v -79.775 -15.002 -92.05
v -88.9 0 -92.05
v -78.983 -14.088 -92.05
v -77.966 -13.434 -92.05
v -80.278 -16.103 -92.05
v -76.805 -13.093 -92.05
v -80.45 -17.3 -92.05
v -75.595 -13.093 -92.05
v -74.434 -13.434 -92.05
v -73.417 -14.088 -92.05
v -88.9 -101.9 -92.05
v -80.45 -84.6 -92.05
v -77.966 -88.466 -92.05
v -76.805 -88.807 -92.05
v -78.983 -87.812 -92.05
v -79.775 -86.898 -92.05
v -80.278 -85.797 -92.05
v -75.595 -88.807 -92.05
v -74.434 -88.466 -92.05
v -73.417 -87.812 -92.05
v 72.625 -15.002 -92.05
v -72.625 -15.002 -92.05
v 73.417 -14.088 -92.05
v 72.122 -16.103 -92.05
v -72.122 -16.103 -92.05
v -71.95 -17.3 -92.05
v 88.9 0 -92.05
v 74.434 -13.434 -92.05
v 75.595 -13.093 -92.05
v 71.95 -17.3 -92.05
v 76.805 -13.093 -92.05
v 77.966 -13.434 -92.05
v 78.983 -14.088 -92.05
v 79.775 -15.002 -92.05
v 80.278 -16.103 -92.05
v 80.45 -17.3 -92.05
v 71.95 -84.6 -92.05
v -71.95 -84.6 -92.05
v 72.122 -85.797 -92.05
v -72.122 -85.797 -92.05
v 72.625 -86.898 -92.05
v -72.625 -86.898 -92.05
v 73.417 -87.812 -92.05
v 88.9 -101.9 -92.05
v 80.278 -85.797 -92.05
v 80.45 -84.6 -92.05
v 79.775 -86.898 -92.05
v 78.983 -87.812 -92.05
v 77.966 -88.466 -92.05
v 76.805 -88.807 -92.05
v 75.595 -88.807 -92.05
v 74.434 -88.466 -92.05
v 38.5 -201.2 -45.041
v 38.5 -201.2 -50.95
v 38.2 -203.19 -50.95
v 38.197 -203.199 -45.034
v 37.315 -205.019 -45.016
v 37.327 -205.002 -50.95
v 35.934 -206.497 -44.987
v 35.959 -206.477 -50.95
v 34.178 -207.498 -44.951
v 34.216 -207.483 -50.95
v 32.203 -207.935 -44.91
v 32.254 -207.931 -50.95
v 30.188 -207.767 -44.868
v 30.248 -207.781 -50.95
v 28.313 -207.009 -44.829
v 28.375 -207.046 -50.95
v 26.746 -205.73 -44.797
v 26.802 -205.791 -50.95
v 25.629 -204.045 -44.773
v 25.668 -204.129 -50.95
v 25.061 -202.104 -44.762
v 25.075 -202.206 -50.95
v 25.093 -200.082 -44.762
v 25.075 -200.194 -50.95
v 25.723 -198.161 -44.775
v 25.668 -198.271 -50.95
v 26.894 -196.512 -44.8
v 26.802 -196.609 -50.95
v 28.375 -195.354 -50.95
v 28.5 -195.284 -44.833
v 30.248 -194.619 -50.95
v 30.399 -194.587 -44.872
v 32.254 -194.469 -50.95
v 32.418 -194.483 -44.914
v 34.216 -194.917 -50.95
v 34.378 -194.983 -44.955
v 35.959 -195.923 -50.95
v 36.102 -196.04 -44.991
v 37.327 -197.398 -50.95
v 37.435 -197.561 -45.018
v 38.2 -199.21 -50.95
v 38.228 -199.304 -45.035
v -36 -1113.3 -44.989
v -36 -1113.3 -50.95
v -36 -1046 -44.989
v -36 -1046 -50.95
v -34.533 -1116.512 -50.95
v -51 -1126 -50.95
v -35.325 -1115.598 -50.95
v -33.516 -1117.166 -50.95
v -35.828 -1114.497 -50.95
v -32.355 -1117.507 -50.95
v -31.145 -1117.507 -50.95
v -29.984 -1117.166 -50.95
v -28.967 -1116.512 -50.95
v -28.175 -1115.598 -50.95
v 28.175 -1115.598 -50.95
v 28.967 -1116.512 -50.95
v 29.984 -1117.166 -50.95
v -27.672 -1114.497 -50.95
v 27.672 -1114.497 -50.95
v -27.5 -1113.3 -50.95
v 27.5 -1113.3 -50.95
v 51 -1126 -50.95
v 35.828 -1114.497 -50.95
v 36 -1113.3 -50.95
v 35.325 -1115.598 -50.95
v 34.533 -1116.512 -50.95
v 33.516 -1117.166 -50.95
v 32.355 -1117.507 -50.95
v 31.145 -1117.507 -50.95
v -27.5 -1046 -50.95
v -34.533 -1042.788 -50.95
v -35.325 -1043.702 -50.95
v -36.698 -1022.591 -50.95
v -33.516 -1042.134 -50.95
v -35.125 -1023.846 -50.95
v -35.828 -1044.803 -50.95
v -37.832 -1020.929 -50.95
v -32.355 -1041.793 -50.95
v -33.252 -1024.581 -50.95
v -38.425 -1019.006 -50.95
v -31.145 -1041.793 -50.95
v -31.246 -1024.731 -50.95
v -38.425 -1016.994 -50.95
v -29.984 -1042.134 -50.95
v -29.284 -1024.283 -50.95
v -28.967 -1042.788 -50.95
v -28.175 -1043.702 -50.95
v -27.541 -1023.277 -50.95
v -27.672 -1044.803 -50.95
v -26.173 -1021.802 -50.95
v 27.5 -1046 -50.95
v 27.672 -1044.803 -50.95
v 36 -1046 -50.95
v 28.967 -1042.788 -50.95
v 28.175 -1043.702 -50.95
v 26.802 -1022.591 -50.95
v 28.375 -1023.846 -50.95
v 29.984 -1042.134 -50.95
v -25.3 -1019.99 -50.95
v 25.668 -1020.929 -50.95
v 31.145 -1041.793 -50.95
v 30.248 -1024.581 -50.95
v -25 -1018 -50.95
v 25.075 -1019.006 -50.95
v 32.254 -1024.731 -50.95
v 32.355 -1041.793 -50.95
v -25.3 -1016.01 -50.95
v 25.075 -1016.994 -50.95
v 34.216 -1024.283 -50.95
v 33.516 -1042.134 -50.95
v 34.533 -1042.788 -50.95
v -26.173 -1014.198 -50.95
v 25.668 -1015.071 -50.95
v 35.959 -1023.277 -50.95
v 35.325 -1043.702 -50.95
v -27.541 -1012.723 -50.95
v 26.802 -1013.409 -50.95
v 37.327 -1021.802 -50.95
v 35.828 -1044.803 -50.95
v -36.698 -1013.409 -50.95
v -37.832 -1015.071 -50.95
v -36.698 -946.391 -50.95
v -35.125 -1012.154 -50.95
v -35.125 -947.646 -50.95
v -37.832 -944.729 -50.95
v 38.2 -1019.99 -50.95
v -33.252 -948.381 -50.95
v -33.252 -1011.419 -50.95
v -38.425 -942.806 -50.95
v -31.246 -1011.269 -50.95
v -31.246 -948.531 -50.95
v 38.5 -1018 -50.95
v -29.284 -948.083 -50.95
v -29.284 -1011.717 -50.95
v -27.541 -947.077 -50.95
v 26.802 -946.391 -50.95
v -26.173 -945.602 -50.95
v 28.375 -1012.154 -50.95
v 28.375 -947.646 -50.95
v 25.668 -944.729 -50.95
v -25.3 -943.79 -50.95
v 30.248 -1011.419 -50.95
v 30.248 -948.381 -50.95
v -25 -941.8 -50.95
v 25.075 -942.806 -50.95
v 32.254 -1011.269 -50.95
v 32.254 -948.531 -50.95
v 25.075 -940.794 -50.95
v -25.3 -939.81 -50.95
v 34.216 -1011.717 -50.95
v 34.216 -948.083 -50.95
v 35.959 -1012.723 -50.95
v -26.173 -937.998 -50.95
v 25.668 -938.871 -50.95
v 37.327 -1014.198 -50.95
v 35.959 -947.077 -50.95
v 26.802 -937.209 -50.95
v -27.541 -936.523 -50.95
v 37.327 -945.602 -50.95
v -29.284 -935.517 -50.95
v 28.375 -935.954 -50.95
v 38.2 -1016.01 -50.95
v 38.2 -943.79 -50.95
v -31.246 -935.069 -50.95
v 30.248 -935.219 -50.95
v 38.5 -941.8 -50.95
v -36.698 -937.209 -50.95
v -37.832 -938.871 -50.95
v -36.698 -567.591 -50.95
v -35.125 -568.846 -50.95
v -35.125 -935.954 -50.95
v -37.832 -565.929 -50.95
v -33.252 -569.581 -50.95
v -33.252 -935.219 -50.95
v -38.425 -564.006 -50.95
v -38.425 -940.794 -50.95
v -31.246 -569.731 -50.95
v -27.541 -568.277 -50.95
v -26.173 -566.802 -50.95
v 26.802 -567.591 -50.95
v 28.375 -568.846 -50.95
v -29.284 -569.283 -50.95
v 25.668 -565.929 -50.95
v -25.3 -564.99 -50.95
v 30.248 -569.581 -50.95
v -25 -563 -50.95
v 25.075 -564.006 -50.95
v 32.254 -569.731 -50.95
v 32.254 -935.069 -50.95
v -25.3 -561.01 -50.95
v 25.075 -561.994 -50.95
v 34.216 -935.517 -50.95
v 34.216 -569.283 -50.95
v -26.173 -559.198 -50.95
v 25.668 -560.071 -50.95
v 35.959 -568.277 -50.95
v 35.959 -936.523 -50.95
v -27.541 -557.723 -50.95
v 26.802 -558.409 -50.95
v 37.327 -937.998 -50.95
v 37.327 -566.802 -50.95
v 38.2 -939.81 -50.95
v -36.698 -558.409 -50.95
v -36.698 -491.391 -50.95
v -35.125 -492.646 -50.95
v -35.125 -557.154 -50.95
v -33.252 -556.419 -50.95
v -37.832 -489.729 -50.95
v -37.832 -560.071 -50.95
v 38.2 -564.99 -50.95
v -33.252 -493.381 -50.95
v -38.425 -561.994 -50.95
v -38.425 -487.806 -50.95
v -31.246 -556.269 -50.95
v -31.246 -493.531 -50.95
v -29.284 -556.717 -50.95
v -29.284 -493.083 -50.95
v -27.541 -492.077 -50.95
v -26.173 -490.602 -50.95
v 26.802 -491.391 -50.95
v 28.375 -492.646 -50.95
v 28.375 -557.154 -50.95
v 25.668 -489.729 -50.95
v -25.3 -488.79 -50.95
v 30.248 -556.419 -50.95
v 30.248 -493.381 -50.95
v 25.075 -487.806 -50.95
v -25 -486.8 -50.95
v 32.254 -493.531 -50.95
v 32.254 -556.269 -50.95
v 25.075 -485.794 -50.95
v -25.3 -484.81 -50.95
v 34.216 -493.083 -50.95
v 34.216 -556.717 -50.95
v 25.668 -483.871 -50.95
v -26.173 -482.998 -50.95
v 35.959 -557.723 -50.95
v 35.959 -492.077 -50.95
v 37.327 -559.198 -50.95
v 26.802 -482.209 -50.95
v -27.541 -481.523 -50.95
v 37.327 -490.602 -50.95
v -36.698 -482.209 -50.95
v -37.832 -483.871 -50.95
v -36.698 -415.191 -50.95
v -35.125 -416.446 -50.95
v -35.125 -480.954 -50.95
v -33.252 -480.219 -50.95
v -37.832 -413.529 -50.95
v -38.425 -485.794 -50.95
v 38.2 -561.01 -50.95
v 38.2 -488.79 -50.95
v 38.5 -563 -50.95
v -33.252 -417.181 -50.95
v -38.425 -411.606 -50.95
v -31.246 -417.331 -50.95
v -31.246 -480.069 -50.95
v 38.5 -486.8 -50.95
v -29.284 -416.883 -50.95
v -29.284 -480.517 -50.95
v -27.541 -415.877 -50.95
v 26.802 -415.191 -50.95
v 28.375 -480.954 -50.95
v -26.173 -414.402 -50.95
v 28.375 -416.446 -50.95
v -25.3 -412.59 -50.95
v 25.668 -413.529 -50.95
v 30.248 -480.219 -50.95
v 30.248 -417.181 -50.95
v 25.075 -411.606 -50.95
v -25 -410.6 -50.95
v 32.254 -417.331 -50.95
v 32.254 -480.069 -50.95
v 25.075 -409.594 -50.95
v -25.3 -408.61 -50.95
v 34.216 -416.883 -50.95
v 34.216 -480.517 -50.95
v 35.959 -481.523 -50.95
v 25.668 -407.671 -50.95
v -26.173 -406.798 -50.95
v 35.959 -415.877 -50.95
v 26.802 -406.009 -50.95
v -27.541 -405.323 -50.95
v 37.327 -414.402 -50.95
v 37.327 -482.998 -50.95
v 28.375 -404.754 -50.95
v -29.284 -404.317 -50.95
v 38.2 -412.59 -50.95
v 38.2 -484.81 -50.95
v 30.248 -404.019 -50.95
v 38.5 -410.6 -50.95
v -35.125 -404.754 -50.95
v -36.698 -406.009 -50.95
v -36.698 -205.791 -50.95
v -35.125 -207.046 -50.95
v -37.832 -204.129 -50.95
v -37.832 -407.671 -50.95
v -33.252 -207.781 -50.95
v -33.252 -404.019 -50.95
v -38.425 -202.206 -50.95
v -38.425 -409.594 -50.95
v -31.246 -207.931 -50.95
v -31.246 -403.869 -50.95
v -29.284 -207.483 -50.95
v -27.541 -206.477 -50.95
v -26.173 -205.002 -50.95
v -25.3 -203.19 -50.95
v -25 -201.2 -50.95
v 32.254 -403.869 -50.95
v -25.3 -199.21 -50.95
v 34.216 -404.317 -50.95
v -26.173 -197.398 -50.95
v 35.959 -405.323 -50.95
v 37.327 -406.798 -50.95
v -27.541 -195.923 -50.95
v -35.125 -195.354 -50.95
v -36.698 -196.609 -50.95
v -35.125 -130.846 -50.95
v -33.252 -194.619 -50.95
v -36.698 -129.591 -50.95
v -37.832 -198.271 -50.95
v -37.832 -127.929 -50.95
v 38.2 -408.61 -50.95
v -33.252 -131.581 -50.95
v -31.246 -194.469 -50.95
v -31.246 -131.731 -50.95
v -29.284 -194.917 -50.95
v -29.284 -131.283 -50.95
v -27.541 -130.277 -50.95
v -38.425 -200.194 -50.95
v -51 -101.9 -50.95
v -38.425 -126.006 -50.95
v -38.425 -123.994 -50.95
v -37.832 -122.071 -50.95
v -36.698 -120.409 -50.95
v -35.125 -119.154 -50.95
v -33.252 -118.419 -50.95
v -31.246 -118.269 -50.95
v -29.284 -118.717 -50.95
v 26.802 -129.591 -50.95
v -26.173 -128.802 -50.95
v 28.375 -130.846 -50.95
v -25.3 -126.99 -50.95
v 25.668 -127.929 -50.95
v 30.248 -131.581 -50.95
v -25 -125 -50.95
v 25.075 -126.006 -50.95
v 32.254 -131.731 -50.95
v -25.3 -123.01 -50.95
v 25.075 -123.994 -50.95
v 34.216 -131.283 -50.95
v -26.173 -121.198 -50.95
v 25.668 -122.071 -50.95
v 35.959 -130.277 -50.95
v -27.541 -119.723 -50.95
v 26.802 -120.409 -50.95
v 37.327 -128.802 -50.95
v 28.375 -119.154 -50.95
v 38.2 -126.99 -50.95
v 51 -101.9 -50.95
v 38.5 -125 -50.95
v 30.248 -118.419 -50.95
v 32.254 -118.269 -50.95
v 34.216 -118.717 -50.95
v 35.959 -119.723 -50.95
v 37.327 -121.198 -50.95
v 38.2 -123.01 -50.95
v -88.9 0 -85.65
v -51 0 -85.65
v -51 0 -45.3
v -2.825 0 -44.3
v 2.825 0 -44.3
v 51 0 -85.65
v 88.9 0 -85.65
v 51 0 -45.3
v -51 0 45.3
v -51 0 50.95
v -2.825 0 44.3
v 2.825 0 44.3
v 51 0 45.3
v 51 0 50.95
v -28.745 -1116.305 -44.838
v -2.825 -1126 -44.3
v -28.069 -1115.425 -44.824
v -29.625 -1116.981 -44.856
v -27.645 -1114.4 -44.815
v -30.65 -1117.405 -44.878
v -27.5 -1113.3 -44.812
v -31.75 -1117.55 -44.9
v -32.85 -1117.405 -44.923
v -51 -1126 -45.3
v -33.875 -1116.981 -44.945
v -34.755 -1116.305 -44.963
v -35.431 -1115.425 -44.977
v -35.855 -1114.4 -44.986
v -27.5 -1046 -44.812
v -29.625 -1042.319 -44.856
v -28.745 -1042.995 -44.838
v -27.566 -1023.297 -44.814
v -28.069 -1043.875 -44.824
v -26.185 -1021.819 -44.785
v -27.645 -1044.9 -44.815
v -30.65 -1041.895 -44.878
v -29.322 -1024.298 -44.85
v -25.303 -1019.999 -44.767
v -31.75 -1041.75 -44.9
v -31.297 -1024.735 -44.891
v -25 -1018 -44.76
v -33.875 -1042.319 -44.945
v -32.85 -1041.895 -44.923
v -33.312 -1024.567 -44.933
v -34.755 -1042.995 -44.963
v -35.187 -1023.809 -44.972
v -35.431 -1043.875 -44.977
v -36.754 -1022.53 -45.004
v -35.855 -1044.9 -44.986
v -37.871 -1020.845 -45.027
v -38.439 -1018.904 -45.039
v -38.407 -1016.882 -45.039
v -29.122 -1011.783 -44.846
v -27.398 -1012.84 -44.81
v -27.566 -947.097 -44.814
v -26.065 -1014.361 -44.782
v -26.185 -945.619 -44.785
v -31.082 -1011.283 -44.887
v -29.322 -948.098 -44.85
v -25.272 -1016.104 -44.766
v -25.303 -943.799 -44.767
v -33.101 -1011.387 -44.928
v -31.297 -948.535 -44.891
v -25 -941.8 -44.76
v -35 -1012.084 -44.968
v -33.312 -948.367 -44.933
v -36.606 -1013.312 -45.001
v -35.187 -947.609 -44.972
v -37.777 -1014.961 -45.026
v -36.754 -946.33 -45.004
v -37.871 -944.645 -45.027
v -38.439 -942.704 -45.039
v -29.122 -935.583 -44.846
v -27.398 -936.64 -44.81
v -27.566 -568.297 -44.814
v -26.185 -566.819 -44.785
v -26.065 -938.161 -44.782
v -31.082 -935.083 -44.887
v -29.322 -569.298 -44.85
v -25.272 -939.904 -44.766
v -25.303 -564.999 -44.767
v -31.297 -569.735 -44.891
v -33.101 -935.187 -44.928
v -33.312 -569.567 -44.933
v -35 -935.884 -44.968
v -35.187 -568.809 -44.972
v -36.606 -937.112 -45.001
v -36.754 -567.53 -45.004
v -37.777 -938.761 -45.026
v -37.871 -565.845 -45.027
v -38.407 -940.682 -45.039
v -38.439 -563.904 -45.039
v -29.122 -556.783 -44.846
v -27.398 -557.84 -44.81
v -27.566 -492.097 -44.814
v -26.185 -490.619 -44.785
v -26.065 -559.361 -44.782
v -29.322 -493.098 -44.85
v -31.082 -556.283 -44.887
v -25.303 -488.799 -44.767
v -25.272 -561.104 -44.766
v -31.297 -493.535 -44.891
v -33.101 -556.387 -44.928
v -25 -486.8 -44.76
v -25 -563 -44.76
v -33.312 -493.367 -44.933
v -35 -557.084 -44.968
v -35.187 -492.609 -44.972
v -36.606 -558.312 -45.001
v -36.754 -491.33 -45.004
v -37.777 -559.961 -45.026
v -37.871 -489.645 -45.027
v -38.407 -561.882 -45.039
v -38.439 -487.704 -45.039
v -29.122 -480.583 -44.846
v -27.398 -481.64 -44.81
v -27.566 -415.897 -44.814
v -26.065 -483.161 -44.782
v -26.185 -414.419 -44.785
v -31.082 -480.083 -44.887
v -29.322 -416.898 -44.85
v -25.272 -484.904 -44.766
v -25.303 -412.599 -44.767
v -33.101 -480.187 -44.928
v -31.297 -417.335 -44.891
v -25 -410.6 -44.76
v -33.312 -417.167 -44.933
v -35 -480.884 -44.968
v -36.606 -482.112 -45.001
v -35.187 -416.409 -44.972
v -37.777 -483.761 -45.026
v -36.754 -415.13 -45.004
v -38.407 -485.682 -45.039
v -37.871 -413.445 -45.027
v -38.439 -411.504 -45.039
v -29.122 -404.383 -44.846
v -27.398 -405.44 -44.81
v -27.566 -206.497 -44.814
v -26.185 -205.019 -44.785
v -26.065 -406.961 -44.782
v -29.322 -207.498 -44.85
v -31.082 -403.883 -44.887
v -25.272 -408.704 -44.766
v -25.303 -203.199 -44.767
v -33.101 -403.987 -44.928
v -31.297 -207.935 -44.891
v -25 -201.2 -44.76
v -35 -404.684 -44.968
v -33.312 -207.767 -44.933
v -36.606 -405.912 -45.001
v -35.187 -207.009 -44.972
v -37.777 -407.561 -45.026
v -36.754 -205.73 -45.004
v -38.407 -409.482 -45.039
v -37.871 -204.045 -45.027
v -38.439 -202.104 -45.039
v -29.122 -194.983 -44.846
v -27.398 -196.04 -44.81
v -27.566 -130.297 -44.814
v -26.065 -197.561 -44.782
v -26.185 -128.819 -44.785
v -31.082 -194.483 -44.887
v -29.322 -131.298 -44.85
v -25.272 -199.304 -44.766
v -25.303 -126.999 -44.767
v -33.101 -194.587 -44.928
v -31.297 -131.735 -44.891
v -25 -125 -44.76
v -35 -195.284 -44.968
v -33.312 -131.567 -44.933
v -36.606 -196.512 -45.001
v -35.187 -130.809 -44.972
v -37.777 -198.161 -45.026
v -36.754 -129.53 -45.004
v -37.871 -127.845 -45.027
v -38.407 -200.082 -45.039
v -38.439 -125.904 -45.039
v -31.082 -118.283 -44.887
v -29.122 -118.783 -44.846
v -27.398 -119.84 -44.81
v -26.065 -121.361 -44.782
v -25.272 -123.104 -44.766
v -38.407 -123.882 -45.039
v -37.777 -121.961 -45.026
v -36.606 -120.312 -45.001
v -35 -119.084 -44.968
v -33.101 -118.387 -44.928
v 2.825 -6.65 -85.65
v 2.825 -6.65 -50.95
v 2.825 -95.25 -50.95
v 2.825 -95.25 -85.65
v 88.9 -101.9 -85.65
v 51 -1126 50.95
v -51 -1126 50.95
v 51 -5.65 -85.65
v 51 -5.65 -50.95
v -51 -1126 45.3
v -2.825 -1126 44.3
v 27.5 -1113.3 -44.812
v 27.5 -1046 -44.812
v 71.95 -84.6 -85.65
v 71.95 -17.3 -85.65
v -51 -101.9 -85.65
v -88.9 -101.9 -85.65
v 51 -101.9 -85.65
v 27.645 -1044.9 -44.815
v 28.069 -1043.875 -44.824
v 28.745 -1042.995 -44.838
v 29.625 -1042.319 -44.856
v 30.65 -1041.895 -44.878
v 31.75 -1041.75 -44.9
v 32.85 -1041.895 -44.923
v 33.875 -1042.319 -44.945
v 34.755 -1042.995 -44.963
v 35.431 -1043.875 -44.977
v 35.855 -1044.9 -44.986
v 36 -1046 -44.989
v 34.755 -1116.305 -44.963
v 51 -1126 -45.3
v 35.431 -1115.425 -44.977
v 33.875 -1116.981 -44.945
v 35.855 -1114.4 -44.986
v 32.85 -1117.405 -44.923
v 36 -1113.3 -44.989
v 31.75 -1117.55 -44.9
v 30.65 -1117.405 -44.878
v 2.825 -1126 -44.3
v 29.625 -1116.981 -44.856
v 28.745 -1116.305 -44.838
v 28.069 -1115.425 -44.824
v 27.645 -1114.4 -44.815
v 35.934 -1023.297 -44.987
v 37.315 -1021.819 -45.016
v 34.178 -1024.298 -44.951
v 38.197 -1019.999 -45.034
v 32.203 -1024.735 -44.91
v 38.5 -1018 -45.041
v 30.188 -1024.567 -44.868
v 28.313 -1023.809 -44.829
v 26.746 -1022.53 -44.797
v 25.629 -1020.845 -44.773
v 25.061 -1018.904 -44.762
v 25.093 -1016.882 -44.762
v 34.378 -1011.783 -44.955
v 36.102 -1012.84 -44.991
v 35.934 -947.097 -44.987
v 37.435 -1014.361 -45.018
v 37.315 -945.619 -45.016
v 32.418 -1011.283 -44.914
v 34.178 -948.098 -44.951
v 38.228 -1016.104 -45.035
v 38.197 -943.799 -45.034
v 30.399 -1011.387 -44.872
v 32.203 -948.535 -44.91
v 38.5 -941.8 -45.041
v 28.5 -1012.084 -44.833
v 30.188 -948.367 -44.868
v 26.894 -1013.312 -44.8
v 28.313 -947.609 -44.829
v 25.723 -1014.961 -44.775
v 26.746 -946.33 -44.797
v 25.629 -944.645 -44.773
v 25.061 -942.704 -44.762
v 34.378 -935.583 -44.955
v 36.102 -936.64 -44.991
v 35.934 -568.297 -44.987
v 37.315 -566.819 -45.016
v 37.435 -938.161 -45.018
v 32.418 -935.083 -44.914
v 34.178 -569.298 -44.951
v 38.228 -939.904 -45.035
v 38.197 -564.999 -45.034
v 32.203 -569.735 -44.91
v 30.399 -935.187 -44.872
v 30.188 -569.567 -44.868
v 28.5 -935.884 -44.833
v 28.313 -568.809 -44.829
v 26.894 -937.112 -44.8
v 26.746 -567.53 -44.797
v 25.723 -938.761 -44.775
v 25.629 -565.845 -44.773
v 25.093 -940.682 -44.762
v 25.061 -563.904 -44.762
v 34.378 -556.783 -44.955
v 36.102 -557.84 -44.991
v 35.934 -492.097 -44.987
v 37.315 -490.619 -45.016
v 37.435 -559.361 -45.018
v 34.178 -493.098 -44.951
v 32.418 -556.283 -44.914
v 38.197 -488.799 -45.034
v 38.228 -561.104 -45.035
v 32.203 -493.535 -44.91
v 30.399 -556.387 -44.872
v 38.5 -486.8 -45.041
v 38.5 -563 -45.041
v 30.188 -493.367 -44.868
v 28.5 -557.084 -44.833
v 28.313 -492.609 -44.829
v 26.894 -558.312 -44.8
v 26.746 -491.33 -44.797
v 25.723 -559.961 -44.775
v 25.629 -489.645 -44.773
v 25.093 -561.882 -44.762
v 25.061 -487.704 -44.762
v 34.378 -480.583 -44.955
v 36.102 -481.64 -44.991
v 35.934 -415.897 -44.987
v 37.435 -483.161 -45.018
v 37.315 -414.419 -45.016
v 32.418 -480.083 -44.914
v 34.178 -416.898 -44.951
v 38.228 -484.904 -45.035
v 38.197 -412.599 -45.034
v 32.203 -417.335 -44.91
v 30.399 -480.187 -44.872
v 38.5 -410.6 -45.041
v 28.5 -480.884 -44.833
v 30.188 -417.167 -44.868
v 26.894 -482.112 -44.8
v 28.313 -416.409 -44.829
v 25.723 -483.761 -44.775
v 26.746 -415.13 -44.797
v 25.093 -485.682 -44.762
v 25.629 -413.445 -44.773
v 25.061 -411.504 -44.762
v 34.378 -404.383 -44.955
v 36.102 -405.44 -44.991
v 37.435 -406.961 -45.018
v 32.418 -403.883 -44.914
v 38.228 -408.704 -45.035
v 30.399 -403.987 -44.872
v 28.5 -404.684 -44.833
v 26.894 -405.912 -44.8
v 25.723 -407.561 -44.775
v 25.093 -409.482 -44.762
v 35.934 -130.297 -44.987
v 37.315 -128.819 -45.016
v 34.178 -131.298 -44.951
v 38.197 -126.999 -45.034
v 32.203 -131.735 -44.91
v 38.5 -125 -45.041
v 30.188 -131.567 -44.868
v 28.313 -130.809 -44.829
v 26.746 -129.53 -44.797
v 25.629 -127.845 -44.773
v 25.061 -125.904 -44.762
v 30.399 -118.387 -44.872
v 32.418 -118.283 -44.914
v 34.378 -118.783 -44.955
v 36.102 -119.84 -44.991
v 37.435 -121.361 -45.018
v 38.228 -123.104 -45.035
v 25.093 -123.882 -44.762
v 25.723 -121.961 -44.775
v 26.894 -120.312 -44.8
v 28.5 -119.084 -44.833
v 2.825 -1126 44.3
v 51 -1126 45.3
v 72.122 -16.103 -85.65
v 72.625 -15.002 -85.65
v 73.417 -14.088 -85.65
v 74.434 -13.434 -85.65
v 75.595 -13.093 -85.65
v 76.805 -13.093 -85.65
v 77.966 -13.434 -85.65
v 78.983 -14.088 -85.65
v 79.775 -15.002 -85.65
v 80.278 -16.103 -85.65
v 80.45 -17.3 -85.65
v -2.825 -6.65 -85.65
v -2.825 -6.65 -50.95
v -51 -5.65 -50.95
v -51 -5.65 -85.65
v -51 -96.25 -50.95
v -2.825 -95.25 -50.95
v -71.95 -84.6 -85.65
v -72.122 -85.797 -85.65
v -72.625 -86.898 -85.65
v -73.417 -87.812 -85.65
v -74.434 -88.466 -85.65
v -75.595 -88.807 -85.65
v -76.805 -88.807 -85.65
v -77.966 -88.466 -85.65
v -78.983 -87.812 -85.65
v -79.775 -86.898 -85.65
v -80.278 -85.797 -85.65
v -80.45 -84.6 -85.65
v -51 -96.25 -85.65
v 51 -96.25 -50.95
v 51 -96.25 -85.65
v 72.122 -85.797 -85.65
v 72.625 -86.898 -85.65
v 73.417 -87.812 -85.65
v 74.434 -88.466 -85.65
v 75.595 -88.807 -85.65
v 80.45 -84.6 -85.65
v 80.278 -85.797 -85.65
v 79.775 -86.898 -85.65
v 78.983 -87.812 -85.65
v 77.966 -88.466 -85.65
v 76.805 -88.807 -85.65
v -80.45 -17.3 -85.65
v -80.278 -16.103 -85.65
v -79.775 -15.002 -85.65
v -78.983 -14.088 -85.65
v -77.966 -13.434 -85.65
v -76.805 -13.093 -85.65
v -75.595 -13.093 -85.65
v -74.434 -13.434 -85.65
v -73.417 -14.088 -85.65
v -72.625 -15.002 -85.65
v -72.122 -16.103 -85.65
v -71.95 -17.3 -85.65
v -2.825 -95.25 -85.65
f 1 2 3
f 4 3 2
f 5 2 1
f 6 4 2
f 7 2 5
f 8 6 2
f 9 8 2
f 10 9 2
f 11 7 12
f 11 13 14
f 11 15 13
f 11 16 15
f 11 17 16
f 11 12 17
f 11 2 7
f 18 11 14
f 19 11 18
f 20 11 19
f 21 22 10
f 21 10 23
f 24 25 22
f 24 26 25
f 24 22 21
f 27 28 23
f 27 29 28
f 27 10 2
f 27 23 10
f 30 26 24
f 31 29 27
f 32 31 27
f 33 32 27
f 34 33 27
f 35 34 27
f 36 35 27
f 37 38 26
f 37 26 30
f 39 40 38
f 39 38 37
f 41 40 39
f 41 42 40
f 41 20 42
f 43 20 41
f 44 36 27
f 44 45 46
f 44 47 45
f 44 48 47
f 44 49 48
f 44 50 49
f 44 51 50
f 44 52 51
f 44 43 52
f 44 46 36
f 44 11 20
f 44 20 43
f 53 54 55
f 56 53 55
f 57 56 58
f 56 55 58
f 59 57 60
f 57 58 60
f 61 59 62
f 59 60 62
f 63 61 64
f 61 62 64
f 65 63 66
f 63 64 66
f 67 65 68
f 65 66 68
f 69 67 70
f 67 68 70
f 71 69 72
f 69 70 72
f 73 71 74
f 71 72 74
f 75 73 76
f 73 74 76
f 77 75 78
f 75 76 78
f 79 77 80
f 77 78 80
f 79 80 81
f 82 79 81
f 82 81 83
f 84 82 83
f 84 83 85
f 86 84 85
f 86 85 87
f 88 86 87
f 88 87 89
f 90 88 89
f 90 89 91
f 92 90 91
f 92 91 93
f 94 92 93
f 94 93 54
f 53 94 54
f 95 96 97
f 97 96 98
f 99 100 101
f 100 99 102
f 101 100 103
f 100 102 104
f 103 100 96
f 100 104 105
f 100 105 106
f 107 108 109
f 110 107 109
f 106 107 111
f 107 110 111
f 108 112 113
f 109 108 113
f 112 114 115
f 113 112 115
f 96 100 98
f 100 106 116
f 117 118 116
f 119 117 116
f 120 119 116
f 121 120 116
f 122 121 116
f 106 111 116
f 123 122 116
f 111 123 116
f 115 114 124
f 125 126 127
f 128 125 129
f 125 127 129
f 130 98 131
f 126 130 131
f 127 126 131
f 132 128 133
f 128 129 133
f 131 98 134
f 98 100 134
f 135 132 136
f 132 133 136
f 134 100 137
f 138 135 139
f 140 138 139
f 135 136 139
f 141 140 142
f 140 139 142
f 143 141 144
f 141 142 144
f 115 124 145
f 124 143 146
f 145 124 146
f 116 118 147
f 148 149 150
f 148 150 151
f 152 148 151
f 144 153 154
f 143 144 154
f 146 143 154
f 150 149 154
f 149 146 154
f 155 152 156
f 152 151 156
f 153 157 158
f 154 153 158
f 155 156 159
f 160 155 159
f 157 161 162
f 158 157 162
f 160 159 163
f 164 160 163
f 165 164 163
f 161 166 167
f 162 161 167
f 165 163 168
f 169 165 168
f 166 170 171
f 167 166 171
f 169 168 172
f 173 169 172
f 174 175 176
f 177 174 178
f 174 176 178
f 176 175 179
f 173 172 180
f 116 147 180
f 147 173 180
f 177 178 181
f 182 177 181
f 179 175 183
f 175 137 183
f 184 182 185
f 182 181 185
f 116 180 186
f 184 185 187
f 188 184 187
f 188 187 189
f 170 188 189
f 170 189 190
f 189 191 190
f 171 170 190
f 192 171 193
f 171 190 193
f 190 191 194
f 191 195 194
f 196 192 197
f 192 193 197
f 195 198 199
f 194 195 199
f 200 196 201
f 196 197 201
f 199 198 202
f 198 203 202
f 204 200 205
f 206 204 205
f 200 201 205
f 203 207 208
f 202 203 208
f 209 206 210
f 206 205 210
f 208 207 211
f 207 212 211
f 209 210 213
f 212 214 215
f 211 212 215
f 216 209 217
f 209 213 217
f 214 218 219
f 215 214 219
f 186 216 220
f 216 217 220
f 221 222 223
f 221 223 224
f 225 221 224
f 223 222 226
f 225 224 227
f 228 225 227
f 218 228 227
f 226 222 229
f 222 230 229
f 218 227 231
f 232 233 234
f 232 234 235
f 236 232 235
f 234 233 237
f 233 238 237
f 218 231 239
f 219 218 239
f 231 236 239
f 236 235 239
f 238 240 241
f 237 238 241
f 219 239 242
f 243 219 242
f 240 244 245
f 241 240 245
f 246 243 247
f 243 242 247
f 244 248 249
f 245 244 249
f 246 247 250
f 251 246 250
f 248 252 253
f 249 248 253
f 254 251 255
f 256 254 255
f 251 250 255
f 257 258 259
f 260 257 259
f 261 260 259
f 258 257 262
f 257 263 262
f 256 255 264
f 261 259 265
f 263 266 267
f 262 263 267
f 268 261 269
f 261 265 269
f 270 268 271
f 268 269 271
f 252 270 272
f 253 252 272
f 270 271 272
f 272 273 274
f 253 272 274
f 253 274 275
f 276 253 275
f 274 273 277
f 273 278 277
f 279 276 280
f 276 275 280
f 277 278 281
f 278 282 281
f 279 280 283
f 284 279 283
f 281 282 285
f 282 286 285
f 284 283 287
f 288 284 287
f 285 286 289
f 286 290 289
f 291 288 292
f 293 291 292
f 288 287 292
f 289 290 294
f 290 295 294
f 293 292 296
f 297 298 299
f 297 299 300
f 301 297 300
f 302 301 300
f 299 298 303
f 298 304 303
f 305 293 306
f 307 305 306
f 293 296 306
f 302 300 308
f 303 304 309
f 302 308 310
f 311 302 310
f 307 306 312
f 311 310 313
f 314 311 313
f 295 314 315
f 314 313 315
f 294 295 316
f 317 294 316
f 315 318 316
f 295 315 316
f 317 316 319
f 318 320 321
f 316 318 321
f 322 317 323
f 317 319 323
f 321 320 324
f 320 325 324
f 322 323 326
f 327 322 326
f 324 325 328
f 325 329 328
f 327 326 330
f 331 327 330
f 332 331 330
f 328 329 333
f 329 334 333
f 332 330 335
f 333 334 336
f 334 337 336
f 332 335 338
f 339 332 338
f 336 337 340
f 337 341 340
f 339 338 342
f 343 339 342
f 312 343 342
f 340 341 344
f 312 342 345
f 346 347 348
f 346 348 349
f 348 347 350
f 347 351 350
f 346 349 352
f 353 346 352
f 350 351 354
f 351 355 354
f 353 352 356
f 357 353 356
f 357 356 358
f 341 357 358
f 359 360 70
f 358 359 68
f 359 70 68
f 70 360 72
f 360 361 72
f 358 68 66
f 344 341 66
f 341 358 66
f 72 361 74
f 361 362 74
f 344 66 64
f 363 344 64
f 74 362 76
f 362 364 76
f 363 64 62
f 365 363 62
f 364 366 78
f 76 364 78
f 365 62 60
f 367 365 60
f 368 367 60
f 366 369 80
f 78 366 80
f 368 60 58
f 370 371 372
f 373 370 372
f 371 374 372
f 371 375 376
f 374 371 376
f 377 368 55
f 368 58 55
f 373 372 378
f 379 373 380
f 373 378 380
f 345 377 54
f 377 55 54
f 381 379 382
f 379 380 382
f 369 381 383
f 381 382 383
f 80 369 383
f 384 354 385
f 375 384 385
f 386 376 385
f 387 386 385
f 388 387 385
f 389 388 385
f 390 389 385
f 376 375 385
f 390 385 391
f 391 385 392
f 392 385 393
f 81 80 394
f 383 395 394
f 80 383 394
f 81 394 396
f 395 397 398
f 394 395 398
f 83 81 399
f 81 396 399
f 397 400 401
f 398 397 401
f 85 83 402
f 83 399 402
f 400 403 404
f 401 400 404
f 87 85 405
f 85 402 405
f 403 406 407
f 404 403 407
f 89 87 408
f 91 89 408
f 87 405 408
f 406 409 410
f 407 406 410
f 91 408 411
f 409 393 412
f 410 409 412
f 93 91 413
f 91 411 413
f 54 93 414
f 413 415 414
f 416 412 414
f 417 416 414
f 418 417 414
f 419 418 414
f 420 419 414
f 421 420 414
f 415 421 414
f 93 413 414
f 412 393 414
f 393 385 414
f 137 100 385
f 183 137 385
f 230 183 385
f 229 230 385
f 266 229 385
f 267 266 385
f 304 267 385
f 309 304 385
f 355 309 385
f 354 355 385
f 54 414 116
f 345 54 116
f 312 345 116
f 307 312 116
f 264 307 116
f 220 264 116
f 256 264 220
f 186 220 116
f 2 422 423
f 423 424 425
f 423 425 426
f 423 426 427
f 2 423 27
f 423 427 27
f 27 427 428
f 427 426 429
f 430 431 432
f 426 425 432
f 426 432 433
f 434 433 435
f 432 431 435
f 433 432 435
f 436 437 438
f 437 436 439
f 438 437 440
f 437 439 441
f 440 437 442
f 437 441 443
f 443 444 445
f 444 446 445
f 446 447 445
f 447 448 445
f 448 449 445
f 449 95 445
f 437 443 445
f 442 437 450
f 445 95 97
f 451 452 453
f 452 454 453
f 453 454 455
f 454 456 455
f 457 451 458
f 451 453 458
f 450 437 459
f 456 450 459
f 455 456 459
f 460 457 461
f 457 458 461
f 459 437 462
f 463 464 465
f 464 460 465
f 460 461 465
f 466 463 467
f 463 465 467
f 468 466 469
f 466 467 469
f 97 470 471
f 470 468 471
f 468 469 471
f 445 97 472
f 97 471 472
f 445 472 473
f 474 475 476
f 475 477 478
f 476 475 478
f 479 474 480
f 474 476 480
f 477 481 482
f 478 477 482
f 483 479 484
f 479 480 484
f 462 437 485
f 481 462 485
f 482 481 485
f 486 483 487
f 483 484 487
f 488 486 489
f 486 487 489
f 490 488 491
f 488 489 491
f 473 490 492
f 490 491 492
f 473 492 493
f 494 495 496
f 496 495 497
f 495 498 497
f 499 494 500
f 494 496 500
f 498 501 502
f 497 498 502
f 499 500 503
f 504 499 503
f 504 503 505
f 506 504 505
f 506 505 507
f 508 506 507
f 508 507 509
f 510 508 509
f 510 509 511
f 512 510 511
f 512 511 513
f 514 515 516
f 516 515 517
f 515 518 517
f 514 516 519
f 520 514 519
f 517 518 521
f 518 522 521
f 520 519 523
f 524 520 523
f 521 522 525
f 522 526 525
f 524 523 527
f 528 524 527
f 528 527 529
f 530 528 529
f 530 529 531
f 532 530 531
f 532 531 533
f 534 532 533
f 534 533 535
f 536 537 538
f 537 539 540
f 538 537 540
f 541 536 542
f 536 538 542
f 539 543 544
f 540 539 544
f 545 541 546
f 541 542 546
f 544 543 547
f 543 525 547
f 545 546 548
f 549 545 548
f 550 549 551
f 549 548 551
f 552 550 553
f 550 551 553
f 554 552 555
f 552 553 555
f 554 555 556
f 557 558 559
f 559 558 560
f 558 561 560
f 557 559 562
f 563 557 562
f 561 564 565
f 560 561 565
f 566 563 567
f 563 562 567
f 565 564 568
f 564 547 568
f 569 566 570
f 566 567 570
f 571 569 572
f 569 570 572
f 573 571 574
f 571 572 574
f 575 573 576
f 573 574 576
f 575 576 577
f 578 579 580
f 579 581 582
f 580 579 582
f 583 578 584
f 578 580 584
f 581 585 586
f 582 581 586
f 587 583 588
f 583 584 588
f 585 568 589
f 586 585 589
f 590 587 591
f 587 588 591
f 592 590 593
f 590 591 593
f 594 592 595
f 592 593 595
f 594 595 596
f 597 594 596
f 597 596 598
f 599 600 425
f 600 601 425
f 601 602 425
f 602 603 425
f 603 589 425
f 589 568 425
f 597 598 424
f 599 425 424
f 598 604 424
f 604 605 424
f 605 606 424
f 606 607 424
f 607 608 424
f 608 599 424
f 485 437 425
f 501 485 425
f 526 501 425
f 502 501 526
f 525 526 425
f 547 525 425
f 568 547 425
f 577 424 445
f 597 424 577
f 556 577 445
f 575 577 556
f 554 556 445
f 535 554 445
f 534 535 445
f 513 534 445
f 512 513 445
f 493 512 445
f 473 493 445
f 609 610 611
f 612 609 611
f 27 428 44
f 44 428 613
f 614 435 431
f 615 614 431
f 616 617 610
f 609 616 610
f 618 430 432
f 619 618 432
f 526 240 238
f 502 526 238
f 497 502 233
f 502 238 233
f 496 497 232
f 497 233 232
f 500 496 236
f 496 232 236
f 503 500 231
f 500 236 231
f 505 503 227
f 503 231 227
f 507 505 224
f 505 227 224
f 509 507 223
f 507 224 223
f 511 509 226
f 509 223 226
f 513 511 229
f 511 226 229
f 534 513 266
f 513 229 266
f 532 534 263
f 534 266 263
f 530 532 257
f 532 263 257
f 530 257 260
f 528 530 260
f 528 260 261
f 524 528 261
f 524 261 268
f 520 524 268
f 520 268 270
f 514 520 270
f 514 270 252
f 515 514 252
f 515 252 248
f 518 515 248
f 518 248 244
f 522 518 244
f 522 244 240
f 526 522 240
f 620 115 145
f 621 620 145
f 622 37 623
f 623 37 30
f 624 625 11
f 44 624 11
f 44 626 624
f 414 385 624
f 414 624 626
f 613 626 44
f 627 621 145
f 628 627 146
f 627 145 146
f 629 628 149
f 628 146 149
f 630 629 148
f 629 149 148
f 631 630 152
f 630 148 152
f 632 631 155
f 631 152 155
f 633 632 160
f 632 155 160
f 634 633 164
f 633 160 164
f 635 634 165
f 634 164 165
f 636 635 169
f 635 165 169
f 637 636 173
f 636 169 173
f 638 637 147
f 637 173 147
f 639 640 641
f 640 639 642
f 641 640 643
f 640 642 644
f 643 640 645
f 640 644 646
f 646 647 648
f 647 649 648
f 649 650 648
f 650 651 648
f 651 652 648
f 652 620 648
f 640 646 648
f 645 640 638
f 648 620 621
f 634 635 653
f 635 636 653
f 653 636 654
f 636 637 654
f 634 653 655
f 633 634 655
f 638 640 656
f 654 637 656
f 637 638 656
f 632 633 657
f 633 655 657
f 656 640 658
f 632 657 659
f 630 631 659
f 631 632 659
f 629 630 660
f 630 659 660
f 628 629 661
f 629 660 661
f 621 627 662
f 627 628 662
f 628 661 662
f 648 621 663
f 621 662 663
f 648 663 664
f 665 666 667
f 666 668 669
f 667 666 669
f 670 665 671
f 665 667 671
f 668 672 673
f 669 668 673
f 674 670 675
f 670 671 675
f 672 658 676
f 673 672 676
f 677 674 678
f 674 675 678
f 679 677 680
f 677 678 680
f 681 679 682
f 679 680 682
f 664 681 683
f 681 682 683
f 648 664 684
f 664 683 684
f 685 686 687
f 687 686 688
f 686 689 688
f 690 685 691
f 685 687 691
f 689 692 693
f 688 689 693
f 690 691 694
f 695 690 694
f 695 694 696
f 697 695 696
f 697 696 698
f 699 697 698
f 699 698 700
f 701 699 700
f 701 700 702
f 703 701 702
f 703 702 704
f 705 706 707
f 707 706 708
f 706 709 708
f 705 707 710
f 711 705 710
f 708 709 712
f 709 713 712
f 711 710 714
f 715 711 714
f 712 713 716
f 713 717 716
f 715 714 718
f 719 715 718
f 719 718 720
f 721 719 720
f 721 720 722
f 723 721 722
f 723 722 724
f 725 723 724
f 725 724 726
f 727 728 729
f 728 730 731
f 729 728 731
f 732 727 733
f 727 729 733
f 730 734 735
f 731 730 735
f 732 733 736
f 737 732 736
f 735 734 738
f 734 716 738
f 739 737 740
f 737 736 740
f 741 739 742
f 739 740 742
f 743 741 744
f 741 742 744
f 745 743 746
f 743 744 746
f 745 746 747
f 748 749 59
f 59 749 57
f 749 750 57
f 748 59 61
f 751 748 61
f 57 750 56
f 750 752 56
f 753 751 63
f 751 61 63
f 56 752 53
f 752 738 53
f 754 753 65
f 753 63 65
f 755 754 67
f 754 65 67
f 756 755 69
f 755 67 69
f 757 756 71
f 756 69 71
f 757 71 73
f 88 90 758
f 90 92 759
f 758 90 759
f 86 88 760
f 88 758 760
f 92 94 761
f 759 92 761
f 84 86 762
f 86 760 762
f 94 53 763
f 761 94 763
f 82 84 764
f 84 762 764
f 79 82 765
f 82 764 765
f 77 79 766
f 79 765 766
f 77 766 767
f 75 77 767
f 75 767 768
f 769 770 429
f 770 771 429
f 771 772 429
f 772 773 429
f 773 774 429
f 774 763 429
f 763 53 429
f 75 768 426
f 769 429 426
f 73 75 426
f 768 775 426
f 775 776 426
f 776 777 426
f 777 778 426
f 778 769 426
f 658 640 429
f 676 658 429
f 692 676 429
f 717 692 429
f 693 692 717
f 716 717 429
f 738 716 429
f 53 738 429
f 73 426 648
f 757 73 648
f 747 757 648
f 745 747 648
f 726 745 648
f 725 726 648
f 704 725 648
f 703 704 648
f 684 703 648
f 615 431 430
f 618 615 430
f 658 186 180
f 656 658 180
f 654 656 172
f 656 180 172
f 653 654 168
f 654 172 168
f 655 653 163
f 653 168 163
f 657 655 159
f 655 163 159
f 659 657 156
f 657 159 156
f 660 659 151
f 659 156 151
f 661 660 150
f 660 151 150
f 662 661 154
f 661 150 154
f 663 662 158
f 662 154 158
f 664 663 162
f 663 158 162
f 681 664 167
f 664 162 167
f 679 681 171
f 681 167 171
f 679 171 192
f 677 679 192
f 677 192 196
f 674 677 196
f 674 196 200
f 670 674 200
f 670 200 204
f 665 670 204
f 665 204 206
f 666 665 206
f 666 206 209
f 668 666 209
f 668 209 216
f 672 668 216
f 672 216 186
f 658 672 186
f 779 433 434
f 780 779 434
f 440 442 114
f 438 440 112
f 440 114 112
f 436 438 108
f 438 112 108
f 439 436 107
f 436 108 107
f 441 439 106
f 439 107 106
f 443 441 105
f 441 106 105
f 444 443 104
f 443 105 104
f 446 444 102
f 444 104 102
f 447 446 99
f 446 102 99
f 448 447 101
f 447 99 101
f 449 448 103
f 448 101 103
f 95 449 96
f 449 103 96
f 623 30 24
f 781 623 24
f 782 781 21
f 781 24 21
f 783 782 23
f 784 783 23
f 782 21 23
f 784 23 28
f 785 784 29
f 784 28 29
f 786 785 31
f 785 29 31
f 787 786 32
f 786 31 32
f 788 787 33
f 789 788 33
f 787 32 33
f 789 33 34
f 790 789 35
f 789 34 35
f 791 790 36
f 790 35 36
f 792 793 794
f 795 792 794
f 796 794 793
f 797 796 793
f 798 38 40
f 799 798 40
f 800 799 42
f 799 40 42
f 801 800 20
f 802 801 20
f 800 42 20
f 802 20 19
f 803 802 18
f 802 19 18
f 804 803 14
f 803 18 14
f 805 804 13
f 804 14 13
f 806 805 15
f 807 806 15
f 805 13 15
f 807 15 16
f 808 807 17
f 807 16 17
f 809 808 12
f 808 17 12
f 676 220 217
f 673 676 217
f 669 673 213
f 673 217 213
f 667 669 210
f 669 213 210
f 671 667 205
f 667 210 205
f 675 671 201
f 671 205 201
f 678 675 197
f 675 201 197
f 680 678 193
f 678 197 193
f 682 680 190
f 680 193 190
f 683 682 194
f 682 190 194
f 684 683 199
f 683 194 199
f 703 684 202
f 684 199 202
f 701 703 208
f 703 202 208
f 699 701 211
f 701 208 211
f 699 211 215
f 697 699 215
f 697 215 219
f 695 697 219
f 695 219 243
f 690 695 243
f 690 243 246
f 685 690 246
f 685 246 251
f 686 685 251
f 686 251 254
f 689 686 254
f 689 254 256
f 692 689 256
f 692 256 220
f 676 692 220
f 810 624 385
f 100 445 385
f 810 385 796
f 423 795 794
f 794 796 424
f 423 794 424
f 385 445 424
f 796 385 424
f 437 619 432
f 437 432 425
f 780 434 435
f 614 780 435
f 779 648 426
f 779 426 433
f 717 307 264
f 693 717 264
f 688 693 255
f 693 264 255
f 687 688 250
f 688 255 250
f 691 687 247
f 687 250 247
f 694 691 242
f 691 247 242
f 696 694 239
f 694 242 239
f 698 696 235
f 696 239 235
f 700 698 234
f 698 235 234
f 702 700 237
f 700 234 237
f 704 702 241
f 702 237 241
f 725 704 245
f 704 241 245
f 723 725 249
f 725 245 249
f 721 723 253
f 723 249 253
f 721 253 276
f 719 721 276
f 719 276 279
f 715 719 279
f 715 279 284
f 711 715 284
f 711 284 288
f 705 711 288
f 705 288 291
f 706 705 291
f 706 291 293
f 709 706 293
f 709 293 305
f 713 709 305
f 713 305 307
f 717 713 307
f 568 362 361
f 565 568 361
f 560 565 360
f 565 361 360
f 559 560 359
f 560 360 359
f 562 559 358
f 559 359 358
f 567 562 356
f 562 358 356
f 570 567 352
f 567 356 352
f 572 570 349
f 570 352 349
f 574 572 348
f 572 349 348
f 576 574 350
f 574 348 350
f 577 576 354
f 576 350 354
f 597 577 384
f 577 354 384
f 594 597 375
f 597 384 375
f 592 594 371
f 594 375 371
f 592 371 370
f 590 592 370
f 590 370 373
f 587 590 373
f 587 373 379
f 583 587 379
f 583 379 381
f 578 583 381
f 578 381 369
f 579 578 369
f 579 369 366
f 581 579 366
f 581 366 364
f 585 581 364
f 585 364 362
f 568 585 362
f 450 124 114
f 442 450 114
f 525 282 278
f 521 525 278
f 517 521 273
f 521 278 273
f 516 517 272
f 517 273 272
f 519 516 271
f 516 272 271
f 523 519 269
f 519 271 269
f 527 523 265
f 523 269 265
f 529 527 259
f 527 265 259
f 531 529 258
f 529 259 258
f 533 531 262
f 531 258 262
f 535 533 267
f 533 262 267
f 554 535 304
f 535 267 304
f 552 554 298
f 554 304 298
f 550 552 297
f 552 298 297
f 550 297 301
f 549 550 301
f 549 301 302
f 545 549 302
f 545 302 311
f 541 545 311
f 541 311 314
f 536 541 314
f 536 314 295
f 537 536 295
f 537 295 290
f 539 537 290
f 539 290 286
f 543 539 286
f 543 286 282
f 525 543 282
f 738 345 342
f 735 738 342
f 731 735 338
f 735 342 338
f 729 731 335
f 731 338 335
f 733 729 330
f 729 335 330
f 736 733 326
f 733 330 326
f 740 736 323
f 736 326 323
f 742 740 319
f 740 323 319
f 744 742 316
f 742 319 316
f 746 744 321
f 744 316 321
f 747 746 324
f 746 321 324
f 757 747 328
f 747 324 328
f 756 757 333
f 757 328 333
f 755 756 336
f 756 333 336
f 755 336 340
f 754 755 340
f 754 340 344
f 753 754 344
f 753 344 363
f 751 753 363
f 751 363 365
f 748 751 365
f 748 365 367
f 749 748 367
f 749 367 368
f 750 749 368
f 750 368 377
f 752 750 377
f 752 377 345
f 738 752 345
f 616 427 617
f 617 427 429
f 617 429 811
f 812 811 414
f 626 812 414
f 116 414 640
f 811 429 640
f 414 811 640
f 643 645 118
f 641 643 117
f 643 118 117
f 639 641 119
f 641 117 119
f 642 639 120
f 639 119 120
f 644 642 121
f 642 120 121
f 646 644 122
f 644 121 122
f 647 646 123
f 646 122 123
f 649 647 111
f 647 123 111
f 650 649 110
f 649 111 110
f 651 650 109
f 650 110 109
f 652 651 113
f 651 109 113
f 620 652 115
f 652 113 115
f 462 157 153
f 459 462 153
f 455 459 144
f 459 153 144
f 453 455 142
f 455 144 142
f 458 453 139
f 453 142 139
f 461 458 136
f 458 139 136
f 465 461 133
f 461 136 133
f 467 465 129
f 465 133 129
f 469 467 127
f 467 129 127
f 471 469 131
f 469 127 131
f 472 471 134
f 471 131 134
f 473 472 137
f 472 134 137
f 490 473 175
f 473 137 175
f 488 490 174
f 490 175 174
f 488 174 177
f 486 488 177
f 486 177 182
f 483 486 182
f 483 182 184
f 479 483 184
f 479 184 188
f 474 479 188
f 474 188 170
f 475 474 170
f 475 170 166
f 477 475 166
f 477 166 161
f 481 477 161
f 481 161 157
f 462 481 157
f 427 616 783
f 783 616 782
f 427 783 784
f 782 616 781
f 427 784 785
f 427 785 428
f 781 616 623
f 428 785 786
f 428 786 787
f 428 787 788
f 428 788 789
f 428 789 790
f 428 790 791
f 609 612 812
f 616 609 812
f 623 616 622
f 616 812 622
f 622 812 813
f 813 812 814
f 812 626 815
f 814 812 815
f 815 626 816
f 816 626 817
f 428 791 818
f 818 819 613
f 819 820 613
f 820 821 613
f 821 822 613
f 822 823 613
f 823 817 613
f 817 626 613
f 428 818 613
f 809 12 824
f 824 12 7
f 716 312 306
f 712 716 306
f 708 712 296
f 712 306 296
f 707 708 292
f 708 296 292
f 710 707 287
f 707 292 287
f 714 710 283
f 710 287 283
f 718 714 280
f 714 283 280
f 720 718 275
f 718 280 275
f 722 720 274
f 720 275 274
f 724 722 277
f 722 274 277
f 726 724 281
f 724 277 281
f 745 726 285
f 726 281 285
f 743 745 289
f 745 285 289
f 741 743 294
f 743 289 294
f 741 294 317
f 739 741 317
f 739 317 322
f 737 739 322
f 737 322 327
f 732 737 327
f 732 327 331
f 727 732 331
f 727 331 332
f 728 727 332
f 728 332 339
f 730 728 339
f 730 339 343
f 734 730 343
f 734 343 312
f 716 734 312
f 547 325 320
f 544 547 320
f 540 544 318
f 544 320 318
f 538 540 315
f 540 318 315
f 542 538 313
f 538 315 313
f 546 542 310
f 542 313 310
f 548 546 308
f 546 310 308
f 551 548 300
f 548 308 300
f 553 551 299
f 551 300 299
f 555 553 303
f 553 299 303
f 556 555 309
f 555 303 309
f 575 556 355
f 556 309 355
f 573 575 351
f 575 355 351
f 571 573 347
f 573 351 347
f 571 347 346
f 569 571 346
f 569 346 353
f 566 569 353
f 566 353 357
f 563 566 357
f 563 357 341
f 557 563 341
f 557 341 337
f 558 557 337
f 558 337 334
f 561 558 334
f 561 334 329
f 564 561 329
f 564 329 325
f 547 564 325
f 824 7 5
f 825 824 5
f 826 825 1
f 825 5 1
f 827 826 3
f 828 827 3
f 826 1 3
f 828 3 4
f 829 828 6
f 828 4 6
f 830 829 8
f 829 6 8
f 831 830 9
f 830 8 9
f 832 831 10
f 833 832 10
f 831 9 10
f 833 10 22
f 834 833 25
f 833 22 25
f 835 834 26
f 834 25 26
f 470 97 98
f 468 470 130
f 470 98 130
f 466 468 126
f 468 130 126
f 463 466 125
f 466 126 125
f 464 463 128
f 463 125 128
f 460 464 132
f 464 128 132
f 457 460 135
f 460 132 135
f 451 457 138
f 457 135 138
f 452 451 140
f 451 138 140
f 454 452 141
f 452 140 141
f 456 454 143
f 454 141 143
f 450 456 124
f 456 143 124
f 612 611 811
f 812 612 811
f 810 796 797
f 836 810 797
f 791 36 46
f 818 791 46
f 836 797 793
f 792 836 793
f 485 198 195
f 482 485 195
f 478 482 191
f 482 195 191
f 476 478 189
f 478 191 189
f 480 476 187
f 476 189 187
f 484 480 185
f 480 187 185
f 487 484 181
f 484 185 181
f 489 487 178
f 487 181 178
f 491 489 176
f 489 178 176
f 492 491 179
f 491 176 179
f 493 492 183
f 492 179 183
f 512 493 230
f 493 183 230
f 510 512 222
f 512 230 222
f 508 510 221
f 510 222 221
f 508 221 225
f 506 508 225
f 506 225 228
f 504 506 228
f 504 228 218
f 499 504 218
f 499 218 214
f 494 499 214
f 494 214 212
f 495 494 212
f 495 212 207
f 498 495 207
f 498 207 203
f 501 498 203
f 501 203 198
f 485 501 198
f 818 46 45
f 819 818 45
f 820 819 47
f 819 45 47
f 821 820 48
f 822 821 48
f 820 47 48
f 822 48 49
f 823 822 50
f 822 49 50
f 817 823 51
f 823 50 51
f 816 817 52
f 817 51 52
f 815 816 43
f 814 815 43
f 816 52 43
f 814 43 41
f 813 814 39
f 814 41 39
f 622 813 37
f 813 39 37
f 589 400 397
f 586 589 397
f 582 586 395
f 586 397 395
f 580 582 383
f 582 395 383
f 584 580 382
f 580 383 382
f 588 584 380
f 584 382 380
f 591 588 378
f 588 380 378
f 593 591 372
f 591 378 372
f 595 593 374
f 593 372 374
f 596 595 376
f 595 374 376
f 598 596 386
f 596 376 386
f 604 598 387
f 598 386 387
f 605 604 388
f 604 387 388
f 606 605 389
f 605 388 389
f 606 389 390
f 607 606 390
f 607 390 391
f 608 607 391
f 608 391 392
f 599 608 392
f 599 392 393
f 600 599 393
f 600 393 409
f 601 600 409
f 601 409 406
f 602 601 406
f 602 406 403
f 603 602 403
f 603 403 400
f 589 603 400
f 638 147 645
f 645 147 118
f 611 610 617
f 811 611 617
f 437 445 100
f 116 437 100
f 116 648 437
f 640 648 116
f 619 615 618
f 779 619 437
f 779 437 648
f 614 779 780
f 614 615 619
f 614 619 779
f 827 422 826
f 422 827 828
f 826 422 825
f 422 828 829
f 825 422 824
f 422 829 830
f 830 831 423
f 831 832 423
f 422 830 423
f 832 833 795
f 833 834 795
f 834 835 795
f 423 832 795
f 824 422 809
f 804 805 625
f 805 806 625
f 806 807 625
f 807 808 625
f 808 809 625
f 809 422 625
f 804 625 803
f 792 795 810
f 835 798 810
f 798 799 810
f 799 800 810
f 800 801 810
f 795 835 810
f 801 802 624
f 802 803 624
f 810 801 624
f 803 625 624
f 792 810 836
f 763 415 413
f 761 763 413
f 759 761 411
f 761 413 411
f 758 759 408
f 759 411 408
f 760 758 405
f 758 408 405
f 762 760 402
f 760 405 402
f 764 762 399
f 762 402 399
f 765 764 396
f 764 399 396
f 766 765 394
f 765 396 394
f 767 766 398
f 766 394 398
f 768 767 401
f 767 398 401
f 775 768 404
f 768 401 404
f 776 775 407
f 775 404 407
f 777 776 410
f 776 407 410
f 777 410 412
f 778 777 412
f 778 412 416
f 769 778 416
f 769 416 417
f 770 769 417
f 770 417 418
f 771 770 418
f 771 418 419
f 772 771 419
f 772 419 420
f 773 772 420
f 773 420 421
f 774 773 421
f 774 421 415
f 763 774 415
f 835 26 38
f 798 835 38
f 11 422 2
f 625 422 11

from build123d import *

# Parameters (mm, degrees)
F1_DEPTH = 1126
F2_R     = 6.75
F3_DEPTH = 6.190699014
F5_DEPTH = 34.7
F6_W     = 177.8
F6_H     = 101.9
F7_DEPTH = 6.4
F9_DEPTH = 6.4


with BuildPart() as f1:
    # F0 (on Front) → F1 (new body)
    with BuildSketch(Plane.XZ):
        Polygon((51, 50.95), (-51, 50.95), (-51, 45.3), (-2.825, 44.3), (-2.825, -44.3), (-51, -45.3), (-51, -50.95), (51, -50.95), (51, -45.3), (2.825, -44.3), (2.825, 44.3), (51, 45.3), align=None)
    extrude(amount=F1_DEPTH)

    # F2 (on face) → F3 (cut, through all)
    with BuildSketch(Plane(origin=(0, 0, -50.95), x_dir=(1, 0, 0), z_dir=(0, 0, -1))):
        with Locations((-31.75, 563)):
            Circle(F2_R)
        with Locations((31.75, 563)):
            Circle(F2_R)
        with Locations((-31.75, 486.8)):
            Circle(F2_R)
        with Locations((31.75, 486.8)):
            Circle(F2_R)
        with Locations((-31.75, 1018)):
            Circle(F2_R)
        with Locations((31.75, 1018)):
            Circle(F2_R)
        with Locations((-31.75, 941.8)):
            Circle(F2_R)
        with Locations((31.75, 941.8)):
            Circle(F2_R)
        with Locations((-31.75, 410.6)):
            Circle(F2_R)
        with Locations((31.75, 410.6)):
            Circle(F2_R)
        with BuildLine():
            Line((-27.5, 1046), (-27.5, 1113.3))
            ThreePointArc((-27.5, 1113.3), (-31.75, 1117.55), (-36, 1113.3))
            Line((-36, 1113.3), (-36, 1046))
            ThreePointArc((-36, 1046), (-31.75, 1041.75), (-27.5, 1046))
        make_face()
        with BuildLine():
            ThreePointArc((36, 1113.3), (31.75, 1117.55), (27.5, 1113.3))
            Line((27.5, 1113.3), (27.5, 1046))
            ThreePointArc((27.5, 1046), (31.75, 1041.75), (36, 1046))
            Line((36, 1046), (36, 1113.3))
        make_face()
        with Locations((-31.75, 201.2)):
            Circle(F2_R)
        with Locations((31.75, 201.2)):
            Circle(F2_R)
        with Locations((-31.75, 125)):
            Circle(F2_R)
        with Locations((31.75, 125)):
            Circle(F2_R)
    extrude(amount=-F3_DEPTH, mode=Mode.SUBTRACT)

    # F4 (on face) → F5 (join)
    with BuildSketch(Plane(origin=(0, 0, -50.95), x_dir=(1, 0, 0), z_dir=(0, 0, -1))):
        Polygon((51, 101.9), (-51, 101.9), (-51, 96.25), (-2.825, 95.25), (-2.825, 6.65), (-51, 5.65), (-51, 0), (51, 0), (51, 5.65), (2.825, 6.65), (2.825, 95.25), (51, 96.25), align=None)
    extrude(amount=F5_DEPTH)

    # F6 (on face) → F7 (join)
    with BuildSketch(Plane(origin=(0, 0, -85.65), x_dir=(1, 0, 0), z_dir=(0, 0, -1))):
        with Locations((0, 50.95)):
            Rectangle(F6_W, F6_H)
    extrude(amount=F7_DEPTH)

    # F8 (on face) → F9 (cut, through all)
    with BuildSketch(Plane(origin=(0, 0, -92.05), x_dir=(1, 0, 0), z_dir=(0, 0, -1))):
        with BuildLine():
            Line((-71.95, 17.3), (-71.95, 84.6))
            ThreePointArc((-71.95, 84.6), (-76.2, 88.85), (-80.45, 84.6))
            Line((-80.45, 84.6), (-80.45, 17.3))
            ThreePointArc((-80.45, 17.3), (-76.2, 13.05), (-71.95, 17.3))
        make_face()
        with BuildLine():
            ThreePointArc((80.45, 84.6), (76.2, 88.85), (71.95, 84.6))
            Line((71.95, 84.6), (71.95, 17.3))
            ThreePointArc((71.95, 17.3), (76.2, 13.05), (80.45, 17.3))
            Line((80.45, 17.3), (80.45, 84.6))
        make_face()
    extrude(amount=-F9_DEPTH, mode=Mode.SUBTRACT)


solid = f1.part
